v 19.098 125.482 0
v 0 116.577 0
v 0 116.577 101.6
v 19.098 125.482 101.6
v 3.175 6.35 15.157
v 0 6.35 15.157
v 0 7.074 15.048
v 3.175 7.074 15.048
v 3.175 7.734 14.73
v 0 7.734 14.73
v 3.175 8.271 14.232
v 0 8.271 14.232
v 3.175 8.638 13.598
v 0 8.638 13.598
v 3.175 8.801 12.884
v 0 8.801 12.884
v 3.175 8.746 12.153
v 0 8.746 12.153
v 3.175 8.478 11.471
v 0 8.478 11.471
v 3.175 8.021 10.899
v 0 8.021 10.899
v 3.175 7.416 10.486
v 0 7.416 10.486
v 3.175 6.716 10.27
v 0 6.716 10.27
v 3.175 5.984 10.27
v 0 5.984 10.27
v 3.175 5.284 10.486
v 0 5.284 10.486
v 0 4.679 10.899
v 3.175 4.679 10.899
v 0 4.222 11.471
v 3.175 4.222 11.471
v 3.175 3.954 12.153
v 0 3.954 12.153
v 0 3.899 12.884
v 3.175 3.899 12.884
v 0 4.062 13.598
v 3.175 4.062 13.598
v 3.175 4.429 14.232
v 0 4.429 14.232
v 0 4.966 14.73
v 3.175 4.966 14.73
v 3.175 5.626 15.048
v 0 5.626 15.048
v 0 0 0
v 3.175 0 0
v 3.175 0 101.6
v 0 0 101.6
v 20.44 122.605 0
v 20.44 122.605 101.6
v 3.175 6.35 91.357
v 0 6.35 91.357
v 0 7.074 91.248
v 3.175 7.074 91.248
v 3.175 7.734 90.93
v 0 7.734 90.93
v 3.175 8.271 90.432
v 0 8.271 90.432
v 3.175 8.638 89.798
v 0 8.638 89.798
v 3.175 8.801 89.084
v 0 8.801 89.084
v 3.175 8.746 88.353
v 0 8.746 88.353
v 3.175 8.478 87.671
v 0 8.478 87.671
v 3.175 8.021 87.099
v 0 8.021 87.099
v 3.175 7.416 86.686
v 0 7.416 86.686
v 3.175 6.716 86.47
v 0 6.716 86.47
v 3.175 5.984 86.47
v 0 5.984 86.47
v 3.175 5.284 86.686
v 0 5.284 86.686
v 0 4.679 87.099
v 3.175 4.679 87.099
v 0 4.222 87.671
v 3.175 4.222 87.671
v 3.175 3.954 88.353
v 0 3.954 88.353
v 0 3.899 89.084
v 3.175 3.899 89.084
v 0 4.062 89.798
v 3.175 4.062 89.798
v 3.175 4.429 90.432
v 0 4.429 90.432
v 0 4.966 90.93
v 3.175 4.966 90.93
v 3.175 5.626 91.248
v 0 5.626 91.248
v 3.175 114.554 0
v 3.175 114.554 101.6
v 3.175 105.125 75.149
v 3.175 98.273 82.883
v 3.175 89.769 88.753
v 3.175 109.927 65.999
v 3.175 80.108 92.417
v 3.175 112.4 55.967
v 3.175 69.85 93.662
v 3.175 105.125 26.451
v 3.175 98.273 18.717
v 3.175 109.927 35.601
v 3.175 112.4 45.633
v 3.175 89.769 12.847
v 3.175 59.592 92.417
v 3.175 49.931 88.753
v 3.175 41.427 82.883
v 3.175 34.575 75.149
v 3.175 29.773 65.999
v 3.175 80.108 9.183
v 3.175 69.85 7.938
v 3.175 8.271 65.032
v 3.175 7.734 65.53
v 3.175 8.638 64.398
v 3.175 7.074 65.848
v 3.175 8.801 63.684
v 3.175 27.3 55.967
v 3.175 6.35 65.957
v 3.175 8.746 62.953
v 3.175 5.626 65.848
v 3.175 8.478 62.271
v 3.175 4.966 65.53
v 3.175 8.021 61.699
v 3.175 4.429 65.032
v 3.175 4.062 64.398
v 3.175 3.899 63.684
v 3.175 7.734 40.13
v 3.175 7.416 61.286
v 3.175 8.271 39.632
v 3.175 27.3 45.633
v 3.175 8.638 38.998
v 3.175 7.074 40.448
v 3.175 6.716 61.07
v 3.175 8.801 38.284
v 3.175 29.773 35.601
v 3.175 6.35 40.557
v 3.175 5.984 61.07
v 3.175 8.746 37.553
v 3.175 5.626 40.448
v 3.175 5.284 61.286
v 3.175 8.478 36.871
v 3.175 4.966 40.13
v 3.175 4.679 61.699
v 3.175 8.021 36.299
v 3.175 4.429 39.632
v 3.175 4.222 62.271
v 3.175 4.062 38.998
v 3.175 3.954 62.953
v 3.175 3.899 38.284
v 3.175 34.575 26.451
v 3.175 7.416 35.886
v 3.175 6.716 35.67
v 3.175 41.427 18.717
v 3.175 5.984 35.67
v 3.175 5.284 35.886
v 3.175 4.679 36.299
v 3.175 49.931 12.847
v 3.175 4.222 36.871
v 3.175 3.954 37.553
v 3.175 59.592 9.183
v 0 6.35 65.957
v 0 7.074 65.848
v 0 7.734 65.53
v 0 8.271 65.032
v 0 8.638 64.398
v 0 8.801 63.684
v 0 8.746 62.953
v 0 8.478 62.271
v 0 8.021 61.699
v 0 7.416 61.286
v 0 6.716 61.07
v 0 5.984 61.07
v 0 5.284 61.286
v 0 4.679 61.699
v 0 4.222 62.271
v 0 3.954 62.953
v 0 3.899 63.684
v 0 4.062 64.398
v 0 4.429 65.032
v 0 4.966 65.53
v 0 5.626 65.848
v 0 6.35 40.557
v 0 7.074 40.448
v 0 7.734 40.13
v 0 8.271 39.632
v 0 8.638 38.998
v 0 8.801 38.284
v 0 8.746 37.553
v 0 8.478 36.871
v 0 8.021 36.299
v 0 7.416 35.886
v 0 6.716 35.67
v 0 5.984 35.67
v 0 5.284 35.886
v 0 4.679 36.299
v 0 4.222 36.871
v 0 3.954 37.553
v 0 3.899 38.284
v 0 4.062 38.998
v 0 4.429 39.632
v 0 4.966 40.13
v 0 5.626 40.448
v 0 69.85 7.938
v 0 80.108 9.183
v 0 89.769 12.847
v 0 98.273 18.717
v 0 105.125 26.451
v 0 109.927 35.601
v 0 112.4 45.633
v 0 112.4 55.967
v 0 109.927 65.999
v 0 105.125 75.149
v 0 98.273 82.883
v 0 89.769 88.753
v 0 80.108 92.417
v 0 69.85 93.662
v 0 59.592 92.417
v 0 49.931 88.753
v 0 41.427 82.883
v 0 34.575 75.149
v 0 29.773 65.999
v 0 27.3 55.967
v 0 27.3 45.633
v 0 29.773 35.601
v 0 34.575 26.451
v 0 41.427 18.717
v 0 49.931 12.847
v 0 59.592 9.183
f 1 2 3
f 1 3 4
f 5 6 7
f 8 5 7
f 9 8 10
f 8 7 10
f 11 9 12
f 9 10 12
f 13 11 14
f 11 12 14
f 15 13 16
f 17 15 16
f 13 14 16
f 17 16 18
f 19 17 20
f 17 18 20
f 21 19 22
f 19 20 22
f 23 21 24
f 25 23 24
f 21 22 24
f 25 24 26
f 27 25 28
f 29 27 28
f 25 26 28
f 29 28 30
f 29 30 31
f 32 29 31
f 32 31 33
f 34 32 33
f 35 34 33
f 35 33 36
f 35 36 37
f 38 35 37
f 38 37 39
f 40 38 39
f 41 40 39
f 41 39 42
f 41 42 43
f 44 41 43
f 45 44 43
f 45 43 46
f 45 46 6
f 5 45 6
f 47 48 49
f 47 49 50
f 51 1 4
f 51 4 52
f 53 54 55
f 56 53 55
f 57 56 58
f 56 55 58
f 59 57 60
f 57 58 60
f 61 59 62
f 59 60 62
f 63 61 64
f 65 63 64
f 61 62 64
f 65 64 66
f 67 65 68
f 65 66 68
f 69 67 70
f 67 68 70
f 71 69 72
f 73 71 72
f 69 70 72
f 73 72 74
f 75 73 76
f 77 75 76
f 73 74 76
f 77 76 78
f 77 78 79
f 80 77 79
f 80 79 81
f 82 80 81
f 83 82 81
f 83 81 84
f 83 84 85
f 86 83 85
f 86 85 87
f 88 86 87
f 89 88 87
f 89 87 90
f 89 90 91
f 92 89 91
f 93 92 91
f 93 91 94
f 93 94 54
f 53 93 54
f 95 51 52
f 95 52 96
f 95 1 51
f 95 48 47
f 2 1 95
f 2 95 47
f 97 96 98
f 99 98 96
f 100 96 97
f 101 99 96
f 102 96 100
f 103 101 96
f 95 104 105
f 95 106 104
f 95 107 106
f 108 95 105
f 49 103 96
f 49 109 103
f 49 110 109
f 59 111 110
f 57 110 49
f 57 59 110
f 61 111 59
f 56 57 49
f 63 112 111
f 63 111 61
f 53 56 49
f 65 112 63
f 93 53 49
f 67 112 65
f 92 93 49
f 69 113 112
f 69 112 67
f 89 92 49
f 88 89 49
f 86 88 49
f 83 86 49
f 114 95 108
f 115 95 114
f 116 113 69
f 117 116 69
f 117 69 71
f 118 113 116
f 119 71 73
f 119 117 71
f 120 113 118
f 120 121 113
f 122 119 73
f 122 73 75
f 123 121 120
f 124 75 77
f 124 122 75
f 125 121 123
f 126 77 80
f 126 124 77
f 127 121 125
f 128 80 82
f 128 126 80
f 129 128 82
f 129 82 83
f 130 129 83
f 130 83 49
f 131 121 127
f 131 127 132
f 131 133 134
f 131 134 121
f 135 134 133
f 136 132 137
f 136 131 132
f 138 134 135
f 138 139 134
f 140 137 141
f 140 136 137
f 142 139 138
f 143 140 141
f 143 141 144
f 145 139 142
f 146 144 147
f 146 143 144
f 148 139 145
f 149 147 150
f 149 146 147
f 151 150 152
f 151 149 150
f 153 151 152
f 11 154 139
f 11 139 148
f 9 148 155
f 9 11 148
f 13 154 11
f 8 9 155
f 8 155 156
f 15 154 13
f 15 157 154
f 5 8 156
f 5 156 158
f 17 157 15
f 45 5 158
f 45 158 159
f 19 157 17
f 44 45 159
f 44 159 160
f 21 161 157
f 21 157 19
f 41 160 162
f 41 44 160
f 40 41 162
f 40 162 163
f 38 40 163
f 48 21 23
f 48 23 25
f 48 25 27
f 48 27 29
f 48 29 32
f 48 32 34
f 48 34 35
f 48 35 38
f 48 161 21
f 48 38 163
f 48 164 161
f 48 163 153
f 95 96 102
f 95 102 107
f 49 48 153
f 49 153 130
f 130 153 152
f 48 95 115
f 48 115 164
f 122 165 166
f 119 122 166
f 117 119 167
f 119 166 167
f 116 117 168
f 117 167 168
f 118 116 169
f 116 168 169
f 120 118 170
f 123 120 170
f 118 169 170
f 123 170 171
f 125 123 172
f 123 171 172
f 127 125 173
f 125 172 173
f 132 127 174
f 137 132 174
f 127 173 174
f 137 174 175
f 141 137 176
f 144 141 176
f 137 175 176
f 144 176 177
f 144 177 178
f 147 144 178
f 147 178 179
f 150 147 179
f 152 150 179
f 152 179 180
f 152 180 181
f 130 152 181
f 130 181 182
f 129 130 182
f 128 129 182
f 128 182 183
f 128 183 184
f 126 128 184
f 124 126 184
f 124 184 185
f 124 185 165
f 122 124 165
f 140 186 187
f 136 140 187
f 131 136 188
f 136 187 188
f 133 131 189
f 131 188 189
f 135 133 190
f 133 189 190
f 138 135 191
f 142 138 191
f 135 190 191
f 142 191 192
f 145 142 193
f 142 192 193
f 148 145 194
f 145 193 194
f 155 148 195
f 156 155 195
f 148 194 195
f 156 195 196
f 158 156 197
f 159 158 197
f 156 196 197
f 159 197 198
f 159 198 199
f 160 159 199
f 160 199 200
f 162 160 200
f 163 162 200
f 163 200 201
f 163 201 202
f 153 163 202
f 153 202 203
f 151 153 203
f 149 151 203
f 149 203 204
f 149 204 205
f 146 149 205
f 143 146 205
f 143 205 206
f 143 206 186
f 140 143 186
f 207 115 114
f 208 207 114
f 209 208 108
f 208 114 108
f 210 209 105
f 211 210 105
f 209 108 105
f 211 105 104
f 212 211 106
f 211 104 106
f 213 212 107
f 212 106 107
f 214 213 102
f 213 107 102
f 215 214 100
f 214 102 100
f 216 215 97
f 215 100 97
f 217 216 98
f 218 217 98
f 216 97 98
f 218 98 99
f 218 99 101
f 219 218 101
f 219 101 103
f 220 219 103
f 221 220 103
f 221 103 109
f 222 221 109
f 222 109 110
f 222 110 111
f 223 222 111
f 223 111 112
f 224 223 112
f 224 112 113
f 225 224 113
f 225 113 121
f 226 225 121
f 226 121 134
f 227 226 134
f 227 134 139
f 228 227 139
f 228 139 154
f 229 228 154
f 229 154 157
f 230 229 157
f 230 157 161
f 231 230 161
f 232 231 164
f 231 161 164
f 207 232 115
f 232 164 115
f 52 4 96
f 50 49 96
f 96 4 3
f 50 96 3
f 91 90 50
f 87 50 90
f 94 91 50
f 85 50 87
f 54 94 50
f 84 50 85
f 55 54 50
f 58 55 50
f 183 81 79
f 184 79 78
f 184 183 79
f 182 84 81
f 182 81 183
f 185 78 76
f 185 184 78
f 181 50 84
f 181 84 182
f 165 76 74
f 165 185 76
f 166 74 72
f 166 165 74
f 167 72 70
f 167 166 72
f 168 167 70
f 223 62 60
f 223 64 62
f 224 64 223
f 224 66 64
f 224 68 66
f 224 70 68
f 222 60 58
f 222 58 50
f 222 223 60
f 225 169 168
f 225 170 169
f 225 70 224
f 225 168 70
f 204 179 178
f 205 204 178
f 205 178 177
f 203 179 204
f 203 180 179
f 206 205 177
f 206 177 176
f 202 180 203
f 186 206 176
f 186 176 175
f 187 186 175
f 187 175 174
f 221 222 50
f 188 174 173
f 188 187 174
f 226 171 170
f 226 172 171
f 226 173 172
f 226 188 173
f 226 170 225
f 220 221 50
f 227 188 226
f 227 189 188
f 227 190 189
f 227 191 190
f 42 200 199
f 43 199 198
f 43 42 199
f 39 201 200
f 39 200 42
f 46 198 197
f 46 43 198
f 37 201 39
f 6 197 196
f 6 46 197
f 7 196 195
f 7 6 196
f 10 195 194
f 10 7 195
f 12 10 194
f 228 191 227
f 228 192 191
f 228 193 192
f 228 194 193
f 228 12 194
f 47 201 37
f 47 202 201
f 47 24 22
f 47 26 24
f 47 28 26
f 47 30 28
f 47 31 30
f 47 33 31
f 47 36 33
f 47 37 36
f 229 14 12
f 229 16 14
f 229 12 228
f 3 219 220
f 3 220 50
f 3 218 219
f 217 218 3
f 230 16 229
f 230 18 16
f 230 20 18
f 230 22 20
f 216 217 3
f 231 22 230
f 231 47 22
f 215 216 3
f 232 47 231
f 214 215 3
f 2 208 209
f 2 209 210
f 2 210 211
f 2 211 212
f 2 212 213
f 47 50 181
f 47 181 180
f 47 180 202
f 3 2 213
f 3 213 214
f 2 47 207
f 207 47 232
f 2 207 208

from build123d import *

# Parameters (mm, degrees)
BOSS_EXTRUDE1_DEPTH          = 101.6
F_10_0_1935_DIAMETER_HOLE1_D = 4.9149
SKETCH4_R                    = 42.8625
CUT_EXTRUDE1_DEPTH           = 127


with BuildPart() as part:
    # Sketch1 → Boss-Extrude1 (new body)
    with BuildSketch(Plane.XY):
        Polygon((0, 0), (0, 116.576698078), (19.098350362, 125.48240511), (20.440163343, 122.604877886), (3.175, 114.554), (3.175, 0), align=None)
    extrude(amount=BOSS_EXTRUDE1_DEPTH)

    # #10 (0.1935) Diameter Hole1 (through all)
    with Locations(Plane(origin=(3.175, 0, 0), x_dir=(0, 0, -1), z_dir=(1, 0, 0))):
        with Locations((-88.9, 6.35), (-63.5, 6.35), (-38.1, 6.35), (-12.7, 6.35)):
            Hole(F_10_0_1935_DIAMETER_HOLE1_D / 2)

    # Sketch4 → Cut-Extrude1 (cut)
    with BuildSketch(Plane(origin=(3.175, 0, 0), x_dir=(0, 0, -1), z_dir=(1, 0, 0))):
        with Locations((-50.8, 69.85)):
            Circle(SKETCH4_R)
    extrude(amount=-CUT_EXTRUDE1_DEPTH, mode=Mode.SUBTRACT)


solid = part.part
